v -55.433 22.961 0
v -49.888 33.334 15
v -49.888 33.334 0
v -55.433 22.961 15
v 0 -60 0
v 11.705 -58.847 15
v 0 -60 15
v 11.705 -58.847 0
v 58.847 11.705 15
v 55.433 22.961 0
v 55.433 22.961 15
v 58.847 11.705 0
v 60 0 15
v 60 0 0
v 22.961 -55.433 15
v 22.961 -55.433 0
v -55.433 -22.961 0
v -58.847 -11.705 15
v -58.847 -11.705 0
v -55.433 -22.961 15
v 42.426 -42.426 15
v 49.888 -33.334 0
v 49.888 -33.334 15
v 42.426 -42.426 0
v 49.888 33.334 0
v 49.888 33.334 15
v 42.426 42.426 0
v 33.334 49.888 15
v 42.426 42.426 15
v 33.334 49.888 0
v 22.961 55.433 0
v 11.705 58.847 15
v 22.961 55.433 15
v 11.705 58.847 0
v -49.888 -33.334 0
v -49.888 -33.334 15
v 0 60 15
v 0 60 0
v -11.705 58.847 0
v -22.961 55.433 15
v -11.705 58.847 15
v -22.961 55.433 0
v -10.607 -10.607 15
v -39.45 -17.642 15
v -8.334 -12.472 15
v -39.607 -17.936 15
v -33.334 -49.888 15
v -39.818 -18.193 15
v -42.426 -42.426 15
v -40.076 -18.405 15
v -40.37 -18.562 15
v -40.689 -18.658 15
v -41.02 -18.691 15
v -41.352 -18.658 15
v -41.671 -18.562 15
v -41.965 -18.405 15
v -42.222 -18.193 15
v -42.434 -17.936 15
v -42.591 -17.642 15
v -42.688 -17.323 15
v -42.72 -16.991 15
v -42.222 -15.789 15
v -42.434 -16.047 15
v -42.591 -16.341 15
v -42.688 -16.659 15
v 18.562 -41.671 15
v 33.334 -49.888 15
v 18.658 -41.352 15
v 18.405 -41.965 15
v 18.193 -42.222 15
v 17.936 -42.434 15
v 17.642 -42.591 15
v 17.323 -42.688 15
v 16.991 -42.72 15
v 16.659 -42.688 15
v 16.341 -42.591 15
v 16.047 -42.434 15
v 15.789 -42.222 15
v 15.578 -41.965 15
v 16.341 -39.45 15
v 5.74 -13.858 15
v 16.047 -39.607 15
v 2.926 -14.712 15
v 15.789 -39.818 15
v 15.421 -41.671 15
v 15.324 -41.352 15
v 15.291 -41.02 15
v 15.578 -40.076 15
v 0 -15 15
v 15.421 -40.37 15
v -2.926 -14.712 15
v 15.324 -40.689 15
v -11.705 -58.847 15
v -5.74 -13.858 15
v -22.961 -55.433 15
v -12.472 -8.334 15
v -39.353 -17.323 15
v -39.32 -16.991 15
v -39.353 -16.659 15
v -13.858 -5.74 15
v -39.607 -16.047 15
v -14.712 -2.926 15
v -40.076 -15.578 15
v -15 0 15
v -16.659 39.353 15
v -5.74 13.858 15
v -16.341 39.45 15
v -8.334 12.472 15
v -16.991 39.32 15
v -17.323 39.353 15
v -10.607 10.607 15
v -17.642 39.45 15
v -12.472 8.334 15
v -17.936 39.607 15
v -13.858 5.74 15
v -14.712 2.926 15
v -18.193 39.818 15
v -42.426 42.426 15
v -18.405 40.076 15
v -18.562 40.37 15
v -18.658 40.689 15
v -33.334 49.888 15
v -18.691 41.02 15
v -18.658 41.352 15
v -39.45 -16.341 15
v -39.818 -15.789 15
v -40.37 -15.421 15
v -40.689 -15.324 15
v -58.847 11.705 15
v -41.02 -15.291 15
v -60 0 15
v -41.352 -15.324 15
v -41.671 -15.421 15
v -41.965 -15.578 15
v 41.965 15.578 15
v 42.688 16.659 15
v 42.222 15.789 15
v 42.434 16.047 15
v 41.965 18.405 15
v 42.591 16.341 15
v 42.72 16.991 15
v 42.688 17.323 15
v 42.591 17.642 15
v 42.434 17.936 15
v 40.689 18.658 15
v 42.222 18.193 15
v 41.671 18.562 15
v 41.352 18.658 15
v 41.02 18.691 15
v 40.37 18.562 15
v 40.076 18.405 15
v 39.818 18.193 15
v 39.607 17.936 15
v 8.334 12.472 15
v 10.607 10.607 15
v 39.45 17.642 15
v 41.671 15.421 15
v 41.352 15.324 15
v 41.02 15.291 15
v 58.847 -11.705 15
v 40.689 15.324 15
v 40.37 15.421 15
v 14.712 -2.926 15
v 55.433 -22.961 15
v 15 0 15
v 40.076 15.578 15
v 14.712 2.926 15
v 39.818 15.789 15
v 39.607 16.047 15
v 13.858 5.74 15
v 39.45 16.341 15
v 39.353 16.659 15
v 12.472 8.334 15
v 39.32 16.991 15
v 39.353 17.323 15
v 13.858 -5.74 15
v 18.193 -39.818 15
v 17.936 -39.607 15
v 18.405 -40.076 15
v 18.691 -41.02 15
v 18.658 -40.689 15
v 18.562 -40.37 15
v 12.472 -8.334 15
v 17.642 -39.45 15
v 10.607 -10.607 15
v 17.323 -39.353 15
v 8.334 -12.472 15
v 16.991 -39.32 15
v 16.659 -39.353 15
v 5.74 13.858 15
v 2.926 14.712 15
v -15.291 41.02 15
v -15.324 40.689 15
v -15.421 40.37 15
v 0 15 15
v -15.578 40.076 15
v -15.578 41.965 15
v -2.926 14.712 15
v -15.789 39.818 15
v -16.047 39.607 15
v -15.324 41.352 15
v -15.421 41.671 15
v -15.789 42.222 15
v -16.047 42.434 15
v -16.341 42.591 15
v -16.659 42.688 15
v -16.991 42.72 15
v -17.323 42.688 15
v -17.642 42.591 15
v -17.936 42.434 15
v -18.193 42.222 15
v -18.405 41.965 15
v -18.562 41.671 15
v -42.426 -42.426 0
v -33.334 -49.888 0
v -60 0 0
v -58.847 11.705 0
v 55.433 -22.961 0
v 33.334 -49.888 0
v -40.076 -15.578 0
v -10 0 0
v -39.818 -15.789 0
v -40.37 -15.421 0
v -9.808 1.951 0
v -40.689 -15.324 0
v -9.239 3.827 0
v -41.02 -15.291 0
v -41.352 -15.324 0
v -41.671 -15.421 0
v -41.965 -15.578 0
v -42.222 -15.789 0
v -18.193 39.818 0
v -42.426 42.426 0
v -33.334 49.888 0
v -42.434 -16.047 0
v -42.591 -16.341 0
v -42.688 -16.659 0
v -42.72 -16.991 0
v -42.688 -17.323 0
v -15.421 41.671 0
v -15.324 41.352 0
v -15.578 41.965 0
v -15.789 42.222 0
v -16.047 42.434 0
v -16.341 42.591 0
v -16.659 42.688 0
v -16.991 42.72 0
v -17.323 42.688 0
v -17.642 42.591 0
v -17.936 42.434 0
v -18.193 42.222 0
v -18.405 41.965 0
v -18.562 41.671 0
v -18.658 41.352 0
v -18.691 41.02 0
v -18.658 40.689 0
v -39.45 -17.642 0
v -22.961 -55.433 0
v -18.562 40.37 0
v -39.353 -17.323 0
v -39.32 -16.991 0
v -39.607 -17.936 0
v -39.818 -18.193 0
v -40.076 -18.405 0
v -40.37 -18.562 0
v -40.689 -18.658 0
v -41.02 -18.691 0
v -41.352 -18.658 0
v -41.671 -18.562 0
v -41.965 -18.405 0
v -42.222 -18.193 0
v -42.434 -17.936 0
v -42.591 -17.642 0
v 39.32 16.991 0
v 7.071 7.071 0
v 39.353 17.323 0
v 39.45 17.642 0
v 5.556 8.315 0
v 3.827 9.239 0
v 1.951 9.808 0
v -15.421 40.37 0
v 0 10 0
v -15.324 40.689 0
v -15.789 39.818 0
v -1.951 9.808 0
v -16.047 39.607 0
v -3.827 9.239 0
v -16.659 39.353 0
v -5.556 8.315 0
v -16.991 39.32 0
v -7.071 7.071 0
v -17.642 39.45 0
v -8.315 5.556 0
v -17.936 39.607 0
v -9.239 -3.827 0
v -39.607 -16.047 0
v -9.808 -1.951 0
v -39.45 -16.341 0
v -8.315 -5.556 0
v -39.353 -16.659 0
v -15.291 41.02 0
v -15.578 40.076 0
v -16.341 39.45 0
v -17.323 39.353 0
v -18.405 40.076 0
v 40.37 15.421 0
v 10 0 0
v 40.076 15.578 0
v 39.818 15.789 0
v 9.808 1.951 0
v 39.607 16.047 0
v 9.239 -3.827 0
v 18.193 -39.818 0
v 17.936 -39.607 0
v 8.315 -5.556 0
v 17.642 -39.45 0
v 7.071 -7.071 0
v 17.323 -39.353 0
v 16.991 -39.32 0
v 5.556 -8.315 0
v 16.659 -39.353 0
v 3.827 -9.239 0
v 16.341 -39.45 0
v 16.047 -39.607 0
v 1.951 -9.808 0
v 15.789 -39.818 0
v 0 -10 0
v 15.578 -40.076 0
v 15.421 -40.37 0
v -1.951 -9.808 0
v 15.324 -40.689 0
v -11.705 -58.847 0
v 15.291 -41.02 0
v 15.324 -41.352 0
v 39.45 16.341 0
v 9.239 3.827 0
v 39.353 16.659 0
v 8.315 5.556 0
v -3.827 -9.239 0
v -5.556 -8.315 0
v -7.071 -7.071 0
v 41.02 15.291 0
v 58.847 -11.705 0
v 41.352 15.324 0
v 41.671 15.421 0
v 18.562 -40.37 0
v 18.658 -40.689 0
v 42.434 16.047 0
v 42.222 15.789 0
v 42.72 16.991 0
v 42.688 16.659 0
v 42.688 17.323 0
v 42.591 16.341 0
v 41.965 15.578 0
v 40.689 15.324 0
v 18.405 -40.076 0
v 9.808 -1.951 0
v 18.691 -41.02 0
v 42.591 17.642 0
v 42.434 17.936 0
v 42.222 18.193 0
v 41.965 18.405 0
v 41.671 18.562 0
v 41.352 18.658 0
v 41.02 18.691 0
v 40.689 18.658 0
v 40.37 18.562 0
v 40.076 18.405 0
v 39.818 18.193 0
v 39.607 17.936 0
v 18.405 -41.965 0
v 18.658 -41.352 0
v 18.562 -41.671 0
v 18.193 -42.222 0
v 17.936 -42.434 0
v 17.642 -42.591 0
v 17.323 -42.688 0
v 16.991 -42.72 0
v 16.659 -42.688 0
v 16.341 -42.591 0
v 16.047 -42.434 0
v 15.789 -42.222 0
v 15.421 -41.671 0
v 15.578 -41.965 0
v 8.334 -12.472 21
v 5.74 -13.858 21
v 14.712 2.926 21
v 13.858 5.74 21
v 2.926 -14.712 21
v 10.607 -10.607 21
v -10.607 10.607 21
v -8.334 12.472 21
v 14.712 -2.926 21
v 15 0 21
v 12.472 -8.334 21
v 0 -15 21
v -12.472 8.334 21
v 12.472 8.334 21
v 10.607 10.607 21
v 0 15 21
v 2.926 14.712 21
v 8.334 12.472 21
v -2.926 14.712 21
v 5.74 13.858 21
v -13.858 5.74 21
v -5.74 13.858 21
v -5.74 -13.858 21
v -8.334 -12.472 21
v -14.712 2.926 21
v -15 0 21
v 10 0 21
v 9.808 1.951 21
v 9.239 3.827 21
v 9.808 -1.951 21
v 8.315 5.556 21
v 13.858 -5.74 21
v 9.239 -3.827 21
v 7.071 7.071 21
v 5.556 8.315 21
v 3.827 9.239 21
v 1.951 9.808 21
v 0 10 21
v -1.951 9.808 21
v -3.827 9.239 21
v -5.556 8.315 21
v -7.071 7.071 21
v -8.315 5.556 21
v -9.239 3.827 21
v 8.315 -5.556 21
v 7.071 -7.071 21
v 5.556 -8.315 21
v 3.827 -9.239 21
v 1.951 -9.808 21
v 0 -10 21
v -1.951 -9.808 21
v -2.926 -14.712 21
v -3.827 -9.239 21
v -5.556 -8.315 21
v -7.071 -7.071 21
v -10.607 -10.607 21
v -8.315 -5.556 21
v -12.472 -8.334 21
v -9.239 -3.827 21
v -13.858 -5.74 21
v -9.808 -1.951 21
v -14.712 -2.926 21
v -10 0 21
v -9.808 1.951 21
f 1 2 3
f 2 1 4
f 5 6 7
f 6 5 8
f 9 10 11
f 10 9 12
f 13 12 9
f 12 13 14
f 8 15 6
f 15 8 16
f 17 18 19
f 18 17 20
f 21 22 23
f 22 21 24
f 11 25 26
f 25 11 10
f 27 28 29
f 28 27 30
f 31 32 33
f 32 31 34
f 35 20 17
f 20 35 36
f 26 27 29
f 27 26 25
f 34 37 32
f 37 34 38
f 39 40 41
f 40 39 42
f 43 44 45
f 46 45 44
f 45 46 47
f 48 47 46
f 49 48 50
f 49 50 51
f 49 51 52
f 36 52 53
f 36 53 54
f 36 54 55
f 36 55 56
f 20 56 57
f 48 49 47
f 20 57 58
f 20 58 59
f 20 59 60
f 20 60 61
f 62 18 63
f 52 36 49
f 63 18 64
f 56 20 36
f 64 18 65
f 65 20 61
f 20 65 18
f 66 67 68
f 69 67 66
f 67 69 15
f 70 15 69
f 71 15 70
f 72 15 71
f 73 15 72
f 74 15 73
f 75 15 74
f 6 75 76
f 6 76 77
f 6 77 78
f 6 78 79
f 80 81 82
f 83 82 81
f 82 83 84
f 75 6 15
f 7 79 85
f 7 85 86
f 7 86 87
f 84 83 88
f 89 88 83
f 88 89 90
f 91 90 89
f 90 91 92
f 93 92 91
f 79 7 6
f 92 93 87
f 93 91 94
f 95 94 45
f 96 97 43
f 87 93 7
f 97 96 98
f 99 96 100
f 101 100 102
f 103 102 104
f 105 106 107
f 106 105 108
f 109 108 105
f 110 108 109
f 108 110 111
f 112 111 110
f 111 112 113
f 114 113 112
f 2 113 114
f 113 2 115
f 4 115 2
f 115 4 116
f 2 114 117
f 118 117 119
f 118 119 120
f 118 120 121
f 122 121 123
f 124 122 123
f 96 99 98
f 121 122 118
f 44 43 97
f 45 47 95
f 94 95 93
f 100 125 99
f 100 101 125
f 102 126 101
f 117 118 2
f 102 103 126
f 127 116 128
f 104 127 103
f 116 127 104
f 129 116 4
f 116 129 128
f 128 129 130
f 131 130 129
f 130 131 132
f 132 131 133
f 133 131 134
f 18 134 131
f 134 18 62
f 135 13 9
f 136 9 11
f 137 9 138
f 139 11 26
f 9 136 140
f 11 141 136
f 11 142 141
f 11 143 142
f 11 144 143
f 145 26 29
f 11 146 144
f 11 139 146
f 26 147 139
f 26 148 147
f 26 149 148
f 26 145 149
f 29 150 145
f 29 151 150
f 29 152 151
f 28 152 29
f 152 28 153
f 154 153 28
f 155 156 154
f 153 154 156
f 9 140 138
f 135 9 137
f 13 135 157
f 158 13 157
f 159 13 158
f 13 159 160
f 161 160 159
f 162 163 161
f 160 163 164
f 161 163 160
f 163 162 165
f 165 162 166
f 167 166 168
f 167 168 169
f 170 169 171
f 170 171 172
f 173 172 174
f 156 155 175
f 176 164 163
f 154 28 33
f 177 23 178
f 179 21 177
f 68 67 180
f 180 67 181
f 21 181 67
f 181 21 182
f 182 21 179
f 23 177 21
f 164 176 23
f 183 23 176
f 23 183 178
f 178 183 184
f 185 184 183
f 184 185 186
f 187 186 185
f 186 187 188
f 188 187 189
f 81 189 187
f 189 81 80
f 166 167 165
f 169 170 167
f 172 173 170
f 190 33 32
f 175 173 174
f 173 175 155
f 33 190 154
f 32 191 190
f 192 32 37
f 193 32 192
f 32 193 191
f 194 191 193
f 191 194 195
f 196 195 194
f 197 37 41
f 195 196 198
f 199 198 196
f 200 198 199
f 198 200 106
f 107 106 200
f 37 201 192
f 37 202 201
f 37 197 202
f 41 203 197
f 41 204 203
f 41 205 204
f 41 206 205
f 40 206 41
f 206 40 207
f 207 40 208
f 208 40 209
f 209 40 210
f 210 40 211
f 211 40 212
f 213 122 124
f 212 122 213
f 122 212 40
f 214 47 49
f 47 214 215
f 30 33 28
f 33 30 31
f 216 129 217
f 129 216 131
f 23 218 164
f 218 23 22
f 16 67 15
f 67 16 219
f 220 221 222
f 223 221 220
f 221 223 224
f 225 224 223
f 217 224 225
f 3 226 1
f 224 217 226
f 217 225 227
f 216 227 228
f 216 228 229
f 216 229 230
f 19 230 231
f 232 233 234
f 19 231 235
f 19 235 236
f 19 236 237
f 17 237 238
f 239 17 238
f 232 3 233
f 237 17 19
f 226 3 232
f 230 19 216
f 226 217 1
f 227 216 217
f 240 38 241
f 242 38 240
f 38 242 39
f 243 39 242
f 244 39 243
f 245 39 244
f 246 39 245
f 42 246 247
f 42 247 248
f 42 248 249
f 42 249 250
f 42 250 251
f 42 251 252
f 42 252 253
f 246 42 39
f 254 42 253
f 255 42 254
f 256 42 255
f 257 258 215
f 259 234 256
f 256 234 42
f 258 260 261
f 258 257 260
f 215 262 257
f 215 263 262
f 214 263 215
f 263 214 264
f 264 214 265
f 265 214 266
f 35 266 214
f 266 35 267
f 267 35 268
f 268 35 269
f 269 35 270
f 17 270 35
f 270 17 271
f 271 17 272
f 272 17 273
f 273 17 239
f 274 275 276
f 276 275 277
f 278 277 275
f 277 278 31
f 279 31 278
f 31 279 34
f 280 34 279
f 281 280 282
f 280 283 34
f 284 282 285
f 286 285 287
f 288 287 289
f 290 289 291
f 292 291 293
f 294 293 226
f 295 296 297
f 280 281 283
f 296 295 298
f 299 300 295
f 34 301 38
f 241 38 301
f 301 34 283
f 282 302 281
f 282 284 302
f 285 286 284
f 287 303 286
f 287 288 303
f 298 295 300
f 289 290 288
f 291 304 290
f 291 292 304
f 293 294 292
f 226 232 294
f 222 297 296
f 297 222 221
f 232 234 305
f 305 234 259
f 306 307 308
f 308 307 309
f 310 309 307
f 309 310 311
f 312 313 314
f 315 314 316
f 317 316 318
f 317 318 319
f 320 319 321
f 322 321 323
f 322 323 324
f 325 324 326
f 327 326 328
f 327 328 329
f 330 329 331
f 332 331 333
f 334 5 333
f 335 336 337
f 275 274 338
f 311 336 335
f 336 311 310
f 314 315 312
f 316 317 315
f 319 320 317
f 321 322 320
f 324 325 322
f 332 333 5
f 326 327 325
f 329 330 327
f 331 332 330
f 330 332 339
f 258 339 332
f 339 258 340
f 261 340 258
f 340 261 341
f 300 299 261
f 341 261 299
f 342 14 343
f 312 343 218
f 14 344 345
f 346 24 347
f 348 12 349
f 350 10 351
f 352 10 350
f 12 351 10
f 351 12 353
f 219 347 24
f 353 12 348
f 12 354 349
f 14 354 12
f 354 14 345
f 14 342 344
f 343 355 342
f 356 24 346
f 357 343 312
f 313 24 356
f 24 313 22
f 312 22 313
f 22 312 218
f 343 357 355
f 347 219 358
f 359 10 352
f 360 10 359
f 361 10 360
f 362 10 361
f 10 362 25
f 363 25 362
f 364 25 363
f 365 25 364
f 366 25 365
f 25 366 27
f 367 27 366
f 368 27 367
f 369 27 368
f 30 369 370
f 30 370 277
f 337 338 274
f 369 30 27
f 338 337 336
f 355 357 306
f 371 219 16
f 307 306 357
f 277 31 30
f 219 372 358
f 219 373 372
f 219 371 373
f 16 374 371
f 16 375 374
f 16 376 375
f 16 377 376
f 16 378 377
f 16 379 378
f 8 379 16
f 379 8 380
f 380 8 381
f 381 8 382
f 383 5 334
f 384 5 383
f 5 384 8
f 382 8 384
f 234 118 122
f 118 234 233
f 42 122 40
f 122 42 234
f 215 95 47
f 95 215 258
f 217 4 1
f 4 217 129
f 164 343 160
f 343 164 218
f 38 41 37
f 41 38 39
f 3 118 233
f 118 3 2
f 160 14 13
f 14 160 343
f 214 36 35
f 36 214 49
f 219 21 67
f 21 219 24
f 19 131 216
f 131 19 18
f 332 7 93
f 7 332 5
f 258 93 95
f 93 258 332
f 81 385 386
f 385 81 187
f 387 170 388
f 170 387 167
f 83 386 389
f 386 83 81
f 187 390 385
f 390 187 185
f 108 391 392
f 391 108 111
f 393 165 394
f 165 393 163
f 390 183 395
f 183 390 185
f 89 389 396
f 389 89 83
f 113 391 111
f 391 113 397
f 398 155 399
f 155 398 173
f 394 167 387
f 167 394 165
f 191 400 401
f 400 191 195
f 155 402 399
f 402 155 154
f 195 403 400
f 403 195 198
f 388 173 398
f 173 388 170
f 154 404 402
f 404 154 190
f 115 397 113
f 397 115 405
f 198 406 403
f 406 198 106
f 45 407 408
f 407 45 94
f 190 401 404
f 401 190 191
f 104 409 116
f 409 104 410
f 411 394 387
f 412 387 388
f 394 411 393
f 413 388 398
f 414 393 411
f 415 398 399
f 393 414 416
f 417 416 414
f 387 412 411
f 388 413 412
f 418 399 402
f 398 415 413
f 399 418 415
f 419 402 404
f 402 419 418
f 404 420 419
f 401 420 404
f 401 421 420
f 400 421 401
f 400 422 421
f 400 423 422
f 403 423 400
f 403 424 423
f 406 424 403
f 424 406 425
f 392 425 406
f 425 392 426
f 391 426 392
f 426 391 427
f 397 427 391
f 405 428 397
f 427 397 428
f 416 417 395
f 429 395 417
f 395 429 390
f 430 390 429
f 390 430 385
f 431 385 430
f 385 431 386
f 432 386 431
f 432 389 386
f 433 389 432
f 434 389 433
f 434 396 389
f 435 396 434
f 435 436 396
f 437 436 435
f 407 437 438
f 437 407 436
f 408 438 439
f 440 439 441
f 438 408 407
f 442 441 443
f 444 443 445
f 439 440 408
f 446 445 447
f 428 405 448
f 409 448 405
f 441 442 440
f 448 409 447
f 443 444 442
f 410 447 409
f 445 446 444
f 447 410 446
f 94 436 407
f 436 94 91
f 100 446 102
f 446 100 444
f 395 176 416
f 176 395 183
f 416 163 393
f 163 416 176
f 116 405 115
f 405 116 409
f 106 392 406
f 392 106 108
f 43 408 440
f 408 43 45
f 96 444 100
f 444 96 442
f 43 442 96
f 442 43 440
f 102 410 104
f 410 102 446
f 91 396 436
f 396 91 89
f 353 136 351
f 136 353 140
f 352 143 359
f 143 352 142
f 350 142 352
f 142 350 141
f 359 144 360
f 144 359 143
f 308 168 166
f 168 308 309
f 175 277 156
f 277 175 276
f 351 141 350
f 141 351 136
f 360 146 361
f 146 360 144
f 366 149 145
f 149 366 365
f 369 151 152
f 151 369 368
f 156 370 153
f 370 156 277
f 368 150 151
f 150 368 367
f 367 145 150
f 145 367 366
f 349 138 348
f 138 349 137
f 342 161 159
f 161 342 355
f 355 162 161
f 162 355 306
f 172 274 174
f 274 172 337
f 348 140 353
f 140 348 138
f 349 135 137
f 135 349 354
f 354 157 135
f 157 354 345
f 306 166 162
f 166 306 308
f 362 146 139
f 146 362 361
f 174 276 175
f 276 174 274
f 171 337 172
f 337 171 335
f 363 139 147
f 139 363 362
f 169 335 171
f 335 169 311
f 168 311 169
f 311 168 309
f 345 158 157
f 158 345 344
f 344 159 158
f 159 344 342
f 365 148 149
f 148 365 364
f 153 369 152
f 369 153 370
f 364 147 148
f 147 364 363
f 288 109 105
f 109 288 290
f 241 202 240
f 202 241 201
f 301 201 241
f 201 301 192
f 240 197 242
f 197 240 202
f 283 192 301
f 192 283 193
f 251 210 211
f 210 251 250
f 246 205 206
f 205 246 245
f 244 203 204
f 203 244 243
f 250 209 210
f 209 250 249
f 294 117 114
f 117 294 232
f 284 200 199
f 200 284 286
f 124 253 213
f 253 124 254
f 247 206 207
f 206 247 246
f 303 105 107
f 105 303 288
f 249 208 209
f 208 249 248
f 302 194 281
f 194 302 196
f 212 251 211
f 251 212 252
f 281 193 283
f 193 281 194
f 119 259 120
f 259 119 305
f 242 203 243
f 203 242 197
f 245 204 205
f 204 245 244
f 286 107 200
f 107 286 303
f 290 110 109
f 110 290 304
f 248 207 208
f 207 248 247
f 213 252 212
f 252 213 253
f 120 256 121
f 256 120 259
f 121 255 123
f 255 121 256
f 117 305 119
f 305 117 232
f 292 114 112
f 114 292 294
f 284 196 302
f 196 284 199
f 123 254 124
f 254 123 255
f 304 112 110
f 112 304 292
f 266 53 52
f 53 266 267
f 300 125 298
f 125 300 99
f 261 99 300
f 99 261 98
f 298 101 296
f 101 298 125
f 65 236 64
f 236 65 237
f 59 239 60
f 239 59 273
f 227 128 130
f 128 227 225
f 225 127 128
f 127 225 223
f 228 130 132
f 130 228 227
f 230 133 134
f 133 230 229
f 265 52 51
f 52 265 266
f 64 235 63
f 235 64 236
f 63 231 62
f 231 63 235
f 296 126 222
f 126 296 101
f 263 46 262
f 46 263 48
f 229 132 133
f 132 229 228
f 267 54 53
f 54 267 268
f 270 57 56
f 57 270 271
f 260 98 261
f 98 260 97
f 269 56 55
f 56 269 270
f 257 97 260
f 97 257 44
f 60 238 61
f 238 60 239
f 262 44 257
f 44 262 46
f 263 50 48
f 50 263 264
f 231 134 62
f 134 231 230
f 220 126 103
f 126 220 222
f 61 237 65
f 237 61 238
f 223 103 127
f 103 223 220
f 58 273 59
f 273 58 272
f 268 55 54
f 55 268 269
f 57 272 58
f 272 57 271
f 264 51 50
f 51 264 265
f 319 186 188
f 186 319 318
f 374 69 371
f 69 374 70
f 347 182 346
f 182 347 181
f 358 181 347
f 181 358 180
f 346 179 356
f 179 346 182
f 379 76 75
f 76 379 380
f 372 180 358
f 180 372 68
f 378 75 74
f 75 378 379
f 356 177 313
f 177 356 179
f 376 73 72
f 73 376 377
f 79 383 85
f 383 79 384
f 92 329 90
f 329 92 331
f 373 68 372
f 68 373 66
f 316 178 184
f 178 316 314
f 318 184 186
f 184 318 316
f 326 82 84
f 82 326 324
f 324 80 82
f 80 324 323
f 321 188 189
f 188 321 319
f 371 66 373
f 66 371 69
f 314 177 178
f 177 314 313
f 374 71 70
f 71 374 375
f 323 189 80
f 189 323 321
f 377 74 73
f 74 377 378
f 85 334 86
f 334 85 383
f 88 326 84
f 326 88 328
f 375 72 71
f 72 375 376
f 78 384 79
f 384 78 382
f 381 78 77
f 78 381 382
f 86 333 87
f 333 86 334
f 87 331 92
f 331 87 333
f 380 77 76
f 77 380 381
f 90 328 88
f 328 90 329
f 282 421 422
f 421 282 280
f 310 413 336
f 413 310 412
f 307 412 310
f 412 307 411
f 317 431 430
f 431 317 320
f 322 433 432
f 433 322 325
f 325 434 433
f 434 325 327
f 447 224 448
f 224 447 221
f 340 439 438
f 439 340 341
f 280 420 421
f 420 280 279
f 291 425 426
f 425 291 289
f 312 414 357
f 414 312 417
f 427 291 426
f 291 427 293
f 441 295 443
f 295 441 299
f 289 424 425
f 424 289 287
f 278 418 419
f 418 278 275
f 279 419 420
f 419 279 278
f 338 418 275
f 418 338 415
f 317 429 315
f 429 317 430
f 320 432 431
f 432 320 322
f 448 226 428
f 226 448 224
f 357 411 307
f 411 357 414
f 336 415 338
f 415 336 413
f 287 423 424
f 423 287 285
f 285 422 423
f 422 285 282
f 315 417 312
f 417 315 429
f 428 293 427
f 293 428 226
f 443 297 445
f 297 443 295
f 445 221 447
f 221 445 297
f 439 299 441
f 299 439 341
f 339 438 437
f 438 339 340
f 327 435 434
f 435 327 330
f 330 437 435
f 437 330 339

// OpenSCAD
$fn = 32;

// ----------------------------------------------------------------------
// Flange Ø120 x 15
// 4 holes on a Ø88.8 bolt circle, bolted joints
// ----------------------------------------------------------------------

// --- parameters (mm) ---
flange_d = 120;    // outside diameter of the flange
thickness = 15;    // flange thickness
holes = 4;         // number of bolt holes
pcd = 88.8;        // bolt circle diameter
start_deg = 22.5;  // angle of the first hole, from +X
hole_d = 3.4;      // bolt hole diameter
bore_d = 20;       // central through bore
hub_d = 30;        // hub outside diameter
hub_h = 6;         // hub height above the flange face (0 = no hub)

// --- derived feature positions (mm) ---
height = thickness + hub_h;  // = 21   overall height of the part
pcd_r = pcd / 2;             // = 44.4   bolt circle radius
hole_step = 360 / holes;     // = 90   angular pitch
feature_centers = [
  [pcd_r * cos(start_deg + 0 * hole_step), pcd_r * sin(start_deg + 0 * hole_step)],
  [pcd_r * cos(start_deg + 1 * hole_step), pcd_r * sin(start_deg + 1 * hole_step)],
  [pcd_r * cos(start_deg + 2 * hole_step), pcd_r * sin(start_deg + 2 * hole_step)],
  [pcd_r * cos(start_deg + 3 * hole_step), pcd_r * sin(start_deg + 3 * hole_step)]
];   // bolt hole centres on the pitch circle

// flange disc, every hole and the bore cut straight through
difference() {
  union() {
    cylinder(d = flange_d, h = thickness);
    cylinder(d = hub_d, h = height);  // hub, overlapped into the flange
  }
  translate([0, 0, -1]) cylinder(d = bore_d, h = height + 2);  // bore, through
  for (centre = feature_centers)
    translate([centre[0], centre[1], -1]) cylinder(d = hole_d, h = thickness + 2);
}
